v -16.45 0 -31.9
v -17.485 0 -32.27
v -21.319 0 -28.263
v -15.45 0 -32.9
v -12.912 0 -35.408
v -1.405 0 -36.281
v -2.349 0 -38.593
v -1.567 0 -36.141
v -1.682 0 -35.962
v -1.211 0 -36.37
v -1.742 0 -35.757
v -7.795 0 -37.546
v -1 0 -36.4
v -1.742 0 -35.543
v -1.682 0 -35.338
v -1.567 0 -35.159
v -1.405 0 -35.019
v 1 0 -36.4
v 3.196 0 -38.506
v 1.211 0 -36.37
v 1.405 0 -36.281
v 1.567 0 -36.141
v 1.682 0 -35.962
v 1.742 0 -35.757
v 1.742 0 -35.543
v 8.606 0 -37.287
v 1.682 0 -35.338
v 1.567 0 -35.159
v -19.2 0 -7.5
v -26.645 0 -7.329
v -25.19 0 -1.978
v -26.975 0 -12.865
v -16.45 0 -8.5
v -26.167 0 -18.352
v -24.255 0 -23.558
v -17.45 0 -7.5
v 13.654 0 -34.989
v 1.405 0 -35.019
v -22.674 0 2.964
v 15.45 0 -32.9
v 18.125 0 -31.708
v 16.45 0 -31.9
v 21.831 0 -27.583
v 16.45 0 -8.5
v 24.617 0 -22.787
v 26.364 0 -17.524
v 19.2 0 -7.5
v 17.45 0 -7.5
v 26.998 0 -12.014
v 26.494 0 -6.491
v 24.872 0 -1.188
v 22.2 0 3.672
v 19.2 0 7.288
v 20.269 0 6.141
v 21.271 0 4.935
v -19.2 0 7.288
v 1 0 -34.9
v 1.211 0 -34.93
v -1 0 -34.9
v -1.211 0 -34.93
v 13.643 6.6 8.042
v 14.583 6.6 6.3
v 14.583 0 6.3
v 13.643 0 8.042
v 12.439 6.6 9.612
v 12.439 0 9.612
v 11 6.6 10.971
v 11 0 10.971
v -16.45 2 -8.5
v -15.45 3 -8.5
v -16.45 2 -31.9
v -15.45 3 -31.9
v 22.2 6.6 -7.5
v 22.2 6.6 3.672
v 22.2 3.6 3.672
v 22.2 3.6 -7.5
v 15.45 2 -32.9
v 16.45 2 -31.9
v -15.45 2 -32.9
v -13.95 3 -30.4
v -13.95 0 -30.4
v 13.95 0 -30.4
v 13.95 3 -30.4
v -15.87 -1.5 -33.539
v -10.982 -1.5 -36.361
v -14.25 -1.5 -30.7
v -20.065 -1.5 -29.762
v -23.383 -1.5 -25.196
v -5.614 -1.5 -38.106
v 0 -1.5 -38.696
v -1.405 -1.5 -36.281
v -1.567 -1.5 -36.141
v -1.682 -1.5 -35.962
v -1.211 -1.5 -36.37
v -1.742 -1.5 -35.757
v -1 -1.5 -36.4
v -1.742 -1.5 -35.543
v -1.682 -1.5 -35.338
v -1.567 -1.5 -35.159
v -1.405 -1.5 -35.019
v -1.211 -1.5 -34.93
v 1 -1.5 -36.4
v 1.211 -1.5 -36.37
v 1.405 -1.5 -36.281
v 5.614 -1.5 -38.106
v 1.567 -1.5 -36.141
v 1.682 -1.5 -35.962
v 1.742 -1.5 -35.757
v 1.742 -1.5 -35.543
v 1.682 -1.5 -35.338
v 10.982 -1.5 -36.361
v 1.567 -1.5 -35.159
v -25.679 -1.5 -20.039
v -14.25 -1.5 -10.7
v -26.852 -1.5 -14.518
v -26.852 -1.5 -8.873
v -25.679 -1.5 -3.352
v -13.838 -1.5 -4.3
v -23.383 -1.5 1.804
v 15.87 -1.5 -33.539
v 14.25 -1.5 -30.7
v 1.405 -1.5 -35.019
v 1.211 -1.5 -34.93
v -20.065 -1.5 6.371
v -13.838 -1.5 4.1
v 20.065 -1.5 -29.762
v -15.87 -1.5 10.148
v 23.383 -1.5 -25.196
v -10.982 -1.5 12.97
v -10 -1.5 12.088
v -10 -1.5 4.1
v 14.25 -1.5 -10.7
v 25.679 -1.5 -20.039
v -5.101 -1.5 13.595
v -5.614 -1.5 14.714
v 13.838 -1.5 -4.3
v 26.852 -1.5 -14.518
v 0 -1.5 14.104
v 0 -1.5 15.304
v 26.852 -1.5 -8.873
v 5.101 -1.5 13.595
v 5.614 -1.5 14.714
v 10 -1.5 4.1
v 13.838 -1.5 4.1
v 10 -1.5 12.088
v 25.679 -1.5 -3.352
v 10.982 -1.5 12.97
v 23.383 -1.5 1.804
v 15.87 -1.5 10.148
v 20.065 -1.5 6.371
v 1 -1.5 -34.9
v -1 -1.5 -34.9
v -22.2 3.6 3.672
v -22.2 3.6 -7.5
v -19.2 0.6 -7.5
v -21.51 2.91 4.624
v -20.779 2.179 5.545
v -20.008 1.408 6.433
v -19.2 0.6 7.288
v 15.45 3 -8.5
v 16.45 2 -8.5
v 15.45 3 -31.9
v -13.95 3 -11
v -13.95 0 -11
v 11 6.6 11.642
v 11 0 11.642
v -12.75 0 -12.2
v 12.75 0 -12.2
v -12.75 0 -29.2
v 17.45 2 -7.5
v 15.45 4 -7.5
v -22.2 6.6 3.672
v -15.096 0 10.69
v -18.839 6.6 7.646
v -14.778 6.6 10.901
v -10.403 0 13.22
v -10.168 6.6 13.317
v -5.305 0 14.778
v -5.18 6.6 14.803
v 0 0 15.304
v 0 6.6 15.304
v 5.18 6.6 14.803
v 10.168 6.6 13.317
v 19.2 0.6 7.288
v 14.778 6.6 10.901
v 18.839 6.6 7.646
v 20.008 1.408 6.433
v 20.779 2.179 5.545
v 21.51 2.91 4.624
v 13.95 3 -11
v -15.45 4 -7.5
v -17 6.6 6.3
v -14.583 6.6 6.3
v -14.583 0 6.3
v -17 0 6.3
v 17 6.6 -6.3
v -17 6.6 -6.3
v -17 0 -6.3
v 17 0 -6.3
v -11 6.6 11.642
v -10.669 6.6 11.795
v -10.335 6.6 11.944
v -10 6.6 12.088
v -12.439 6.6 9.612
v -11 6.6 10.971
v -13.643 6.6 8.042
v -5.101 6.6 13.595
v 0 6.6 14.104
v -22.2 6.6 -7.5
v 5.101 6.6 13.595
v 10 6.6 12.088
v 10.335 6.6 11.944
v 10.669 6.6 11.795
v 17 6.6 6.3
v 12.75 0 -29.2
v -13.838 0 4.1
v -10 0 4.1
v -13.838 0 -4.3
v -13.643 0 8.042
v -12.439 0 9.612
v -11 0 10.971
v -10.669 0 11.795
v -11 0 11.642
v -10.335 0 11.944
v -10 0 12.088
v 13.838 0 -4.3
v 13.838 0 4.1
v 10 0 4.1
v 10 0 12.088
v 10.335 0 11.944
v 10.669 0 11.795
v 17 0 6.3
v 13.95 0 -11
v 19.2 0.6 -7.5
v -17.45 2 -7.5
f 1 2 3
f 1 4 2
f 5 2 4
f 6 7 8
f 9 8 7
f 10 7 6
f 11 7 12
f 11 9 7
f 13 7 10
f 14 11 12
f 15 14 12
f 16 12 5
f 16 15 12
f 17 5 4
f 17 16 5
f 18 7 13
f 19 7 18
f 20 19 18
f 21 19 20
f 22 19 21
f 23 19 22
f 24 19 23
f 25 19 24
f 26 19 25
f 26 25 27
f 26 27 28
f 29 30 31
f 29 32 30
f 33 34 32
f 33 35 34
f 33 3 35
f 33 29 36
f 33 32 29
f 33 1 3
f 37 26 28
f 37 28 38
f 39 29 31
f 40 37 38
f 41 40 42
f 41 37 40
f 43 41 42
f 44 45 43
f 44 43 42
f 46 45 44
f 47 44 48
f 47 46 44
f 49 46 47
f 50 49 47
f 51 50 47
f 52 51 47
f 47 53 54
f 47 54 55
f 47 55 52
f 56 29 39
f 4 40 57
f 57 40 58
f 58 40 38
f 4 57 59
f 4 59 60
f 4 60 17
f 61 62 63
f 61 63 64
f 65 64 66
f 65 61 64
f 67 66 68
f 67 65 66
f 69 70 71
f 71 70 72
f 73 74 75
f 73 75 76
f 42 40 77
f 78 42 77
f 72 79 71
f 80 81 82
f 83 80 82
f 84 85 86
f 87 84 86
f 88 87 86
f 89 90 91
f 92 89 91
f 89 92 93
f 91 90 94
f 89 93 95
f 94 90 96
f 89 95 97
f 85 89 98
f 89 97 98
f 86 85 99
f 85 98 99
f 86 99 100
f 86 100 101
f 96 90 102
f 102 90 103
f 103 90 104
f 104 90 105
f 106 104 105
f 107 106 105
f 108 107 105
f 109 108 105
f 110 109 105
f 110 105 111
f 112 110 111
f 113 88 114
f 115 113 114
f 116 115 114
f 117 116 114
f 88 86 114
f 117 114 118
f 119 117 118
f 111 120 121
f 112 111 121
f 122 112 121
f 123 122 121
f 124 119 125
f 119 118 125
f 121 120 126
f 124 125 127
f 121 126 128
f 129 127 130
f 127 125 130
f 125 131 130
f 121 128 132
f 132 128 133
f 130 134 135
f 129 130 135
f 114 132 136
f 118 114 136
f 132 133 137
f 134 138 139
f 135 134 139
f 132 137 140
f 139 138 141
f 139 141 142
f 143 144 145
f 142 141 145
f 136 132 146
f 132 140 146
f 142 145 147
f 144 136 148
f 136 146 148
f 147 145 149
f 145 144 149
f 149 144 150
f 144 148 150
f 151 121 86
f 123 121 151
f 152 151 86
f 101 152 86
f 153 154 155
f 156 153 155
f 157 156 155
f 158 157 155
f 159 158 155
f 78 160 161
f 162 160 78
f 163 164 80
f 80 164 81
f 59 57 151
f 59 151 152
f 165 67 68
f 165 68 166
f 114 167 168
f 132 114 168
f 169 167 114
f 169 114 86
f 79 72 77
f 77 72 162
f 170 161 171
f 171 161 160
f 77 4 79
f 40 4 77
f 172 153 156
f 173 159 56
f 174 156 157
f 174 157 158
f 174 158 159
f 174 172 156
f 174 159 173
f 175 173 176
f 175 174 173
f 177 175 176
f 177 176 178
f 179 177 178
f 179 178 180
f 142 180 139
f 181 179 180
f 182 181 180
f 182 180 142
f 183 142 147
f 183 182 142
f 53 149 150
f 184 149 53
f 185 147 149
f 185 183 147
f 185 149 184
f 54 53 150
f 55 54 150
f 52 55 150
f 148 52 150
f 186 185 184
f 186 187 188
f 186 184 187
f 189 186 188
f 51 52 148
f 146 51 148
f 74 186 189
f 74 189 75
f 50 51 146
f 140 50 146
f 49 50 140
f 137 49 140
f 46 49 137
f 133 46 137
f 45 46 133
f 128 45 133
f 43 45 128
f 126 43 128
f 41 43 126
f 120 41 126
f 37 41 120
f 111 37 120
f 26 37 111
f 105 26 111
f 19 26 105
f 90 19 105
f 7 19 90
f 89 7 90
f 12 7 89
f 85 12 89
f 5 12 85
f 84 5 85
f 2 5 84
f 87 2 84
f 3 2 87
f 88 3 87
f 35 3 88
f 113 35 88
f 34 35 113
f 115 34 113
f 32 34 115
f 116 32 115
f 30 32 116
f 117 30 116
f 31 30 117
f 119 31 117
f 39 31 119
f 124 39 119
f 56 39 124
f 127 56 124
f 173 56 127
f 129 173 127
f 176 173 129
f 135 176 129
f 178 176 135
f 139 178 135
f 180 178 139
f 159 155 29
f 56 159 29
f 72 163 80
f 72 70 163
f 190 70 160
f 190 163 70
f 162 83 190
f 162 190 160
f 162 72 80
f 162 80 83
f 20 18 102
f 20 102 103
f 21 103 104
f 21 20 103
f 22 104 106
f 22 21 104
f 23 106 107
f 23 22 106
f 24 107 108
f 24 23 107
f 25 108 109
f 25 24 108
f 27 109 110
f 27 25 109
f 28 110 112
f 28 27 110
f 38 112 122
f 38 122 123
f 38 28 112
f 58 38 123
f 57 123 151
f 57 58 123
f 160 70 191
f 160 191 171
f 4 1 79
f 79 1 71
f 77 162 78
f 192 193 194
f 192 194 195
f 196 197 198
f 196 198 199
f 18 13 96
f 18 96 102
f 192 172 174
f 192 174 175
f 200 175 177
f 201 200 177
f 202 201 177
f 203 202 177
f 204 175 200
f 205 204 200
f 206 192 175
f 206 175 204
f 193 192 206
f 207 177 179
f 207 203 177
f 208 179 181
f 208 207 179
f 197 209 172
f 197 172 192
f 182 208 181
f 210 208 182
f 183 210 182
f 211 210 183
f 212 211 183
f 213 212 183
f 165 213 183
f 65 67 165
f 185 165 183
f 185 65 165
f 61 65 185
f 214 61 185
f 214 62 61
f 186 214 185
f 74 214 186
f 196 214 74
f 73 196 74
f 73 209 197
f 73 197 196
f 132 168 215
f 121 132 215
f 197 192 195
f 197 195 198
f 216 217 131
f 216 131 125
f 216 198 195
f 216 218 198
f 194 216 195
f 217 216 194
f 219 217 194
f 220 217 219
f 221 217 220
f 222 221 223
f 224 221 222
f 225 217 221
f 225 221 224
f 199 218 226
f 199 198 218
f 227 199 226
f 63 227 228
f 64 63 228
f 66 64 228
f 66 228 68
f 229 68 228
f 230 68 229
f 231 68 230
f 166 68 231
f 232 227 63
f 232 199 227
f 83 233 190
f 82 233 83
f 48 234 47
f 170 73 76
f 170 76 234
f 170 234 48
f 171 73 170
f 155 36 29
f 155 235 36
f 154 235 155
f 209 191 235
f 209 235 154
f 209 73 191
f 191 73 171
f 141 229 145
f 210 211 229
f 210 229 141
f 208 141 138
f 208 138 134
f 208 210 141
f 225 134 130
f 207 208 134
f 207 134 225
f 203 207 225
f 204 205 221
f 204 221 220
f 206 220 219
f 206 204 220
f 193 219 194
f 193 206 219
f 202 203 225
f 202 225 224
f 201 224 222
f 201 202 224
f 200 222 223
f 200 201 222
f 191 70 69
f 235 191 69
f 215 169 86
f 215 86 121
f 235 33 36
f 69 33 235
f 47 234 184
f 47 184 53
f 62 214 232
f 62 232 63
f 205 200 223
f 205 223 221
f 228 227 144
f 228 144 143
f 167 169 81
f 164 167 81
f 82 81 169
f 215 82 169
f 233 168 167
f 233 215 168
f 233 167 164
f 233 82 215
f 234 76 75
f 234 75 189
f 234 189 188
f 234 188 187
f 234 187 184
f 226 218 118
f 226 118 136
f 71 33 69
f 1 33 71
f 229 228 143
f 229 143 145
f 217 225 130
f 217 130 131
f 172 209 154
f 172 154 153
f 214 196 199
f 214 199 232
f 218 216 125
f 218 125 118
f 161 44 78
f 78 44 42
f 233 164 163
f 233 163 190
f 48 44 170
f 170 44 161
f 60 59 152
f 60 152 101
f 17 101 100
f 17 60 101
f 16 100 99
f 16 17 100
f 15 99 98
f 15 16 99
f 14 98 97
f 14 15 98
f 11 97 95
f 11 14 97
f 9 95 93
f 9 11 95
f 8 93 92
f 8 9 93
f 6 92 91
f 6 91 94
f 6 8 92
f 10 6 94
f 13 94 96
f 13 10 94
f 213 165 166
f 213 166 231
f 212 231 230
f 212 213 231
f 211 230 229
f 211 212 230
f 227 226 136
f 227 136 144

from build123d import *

# Parameters (mm, degrees)
SKETCH1_R                      = 27
SKETCH1_W                      = 25.5
SKETCH1_H                      = 17
BOSS_EXTRUDE1_DEPTH            = 1.5
BOSS_EXTRUDE2_START            = 6.6
BOSS_EXTRUDE2_DEPTH            = 6.6
CUT_EXTRUDE1_REACH             = 44.685
CUT_EXTRUDE1_END_RADIUS        = 27
CUT_EXTRUDE1_DIRECTION_2_DEPTH = 1.2
SKETCH1_5_W                    = 32.9
SKETCH1_5_H                    = 25.4
SKETCH1_5_W_2                  = 27.9
SKETCH1_5_H_2                  = 19.4
BOSS_EXTRUDE3_DEPTH            = 3
CHAMFER1_SIZE                  = 1.5
CHAMFER2_SIZE                  = 1


with BuildPart() as part:
    # Sketch1 → Boss-Extrude1 (new body)
    with BuildSketch(Plane(origin=(0, 0, 0), x_dir=(1, 0, 0), z_dir=(0, 1, 0))):
        with Locations(Location((0, 11.695639977, 0), (0, 0, 270))):
            Circle(SKETCH1_R)
        with BuildLine():
            Line((10, -4.1), (10, -12.087547362))
            ThreePointArc((10, -12.087547362), (0, -14.104360023), (-10, -12.087547362))
            Line((-10, -12.087547362), (-10, -4.1))
            Line((-10, -4.1), (-13.837653888, -4.1))
            Line((-13.837653888, -4.1), (-13.837653888, 4.3))
            Line((-13.837653888, 4.3), (13.837653888, 4.3))
            Line((13.837653888, 4.3), (13.837653888, -4.1))
            Line((13.837653888, -4.1), (10, -4.1))
        make_face(mode=Mode.SUBTRACT)
        with BuildLine():
            ThreePointArc((-1, 34.9), (-1.75, 35.65), (-1, 36.4))
            Line((-1, 36.4), (1, 36.4))
            ThreePointArc((1, 36.4), (1.75, 35.65), (1, 34.9))
            Line((1, 34.9), (-1, 34.9))
        make_face(mode=Mode.SUBTRACT)
        with Locations((0, 20.7)):
            Rectangle(SKETCH1_W, SKETCH1_H, mode=Mode.SUBTRACT)
    extrude(amount=-BOSS_EXTRUDE1_DEPTH)

    # Sketch1<3> → Boss-Extrude2 (add)
    with BuildSketch(Plane(origin=(0, 0, 0), x_dir=(1, 0, 0), z_dir=(0, 1, 0)).offset(BOSS_EXTRUDE2_START)):
        with BuildLine():
            Line((-16.45, 7.5), (-22.2, 7.5))
            Line((-22.2, 7.5), (-22.2, -3.671858193))
            ThreePointArc((-22.2, -3.671858193), (0, -15.304360023), (22.2, -3.671858193))
            Line((22.2, -3.671858193), (22.2, 7.5))
            Line((22.2, 7.5), (16.45, 7.5))
            Line((16.45, 7.5), (-16.45, 7.5))
        make_face()
        with BuildLine():
            Line((-17, -6.3), (-17, 6.3))
            Line((-17, 6.3), (17, 6.3))
            Line((17, 6.3), (17, -6.3))
            Line((17, -6.3), (14.582906959, -6.3))
            ThreePointArc((14.582906959, -6.3), (13.072174848, -8.850843183), (11, -10.971032764))
            Line((11, -10.971032764), (11, -11.641883456))
            ThreePointArc((11, -11.641883456), (10.502364214, -11.870020335), (10, -12.087547362))
            ThreePointArc((10, -12.087547362), (0, -14.104360023), (-10, -12.087547362))
            ThreePointArc((-10, -12.087547362), (-10.502364214, -11.870020335), (-11, -11.641883456))
            Line((-11, -11.641883456), (-11, -10.971032764))
            ThreePointArc((-11, -10.971032764), (-13.072174848, -8.850843183), (-14.582906959, -6.3))
            Line((-14.582906959, -6.3), (-17, -6.3))
        make_face(mode=Mode.SUBTRACT)
    extrude(amount=-BOSS_EXTRUDE2_DEPTH)

    # Cut-Extrude1: up to this cylinder (the profile starts inside it)
    cut_extrude1_end = Plane(origin=(0, 1.228571, -11.695639977), z_dir=(0, 1, 0)) * Cylinder(CUT_EXTRUDE1_END_RADIUS, 144.37, mode=Mode.PRIVATE)
    # Sketch2 → Cut-Extrude1 (cut, up to the surface)
    with BuildSketch(Plane.XY.offset(-6.3), mode=Mode.PRIVATE) as cut_extrude1_sk1:
        Polygon((-22.2, 3.6), (-19.2, 0.6), (-19.2, 0), (-22.2, 0), align=None)
    cut_extrude1_tool1 = extrude(cut_extrude1_sk1.sketch, amount=CUT_EXTRUDE1_REACH, mode=Mode.PRIVATE) & cut_extrude1_end
    add(cut_extrude1_tool1.solids().sort_by_distance((-21.057143, 1.228571, -6.3))[0], mode=Mode.SUBTRACT)
    # Sketch2 → Cut-Extrude1 (cut, up to the surface)
    with BuildSketch(Plane.XY.offset(-6.3), mode=Mode.PRIVATE) as cut_extrude1_sk2:
        Polygon((19.2, 0.6), (19.2, 0), (22.2, 0), (22.2, 3.6), align=None)
    cut_extrude1_tool2 = extrude(cut_extrude1_sk2.sketch, amount=CUT_EXTRUDE1_REACH, mode=Mode.PRIVATE) & cut_extrude1_end
    add(cut_extrude1_tool2.solids().sort_by_distance((21.057143, 1.228571, -6.3))[0], mode=Mode.SUBTRACT)

    # Sketch2 → Cut-Extrude1 direction 2 (cut)
    with BuildSketch(Plane.XY.offset(-6.3)):
        Polygon((-22.2, 3.6), (-19.2, 0.6), (-19.2, 0), (-22.2, 0), align=None)
        Polygon((19.2, 0.6), (19.2, 0), (22.2, 0), (22.2, 3.6), align=None)
    extrude(amount=-CUT_EXTRUDE1_DIRECTION_2_DEPTH, mode=Mode.SUBTRACT)

    # Sketch1<5> → Boss-Extrude3 (add)
    with BuildSketch(Plane(origin=(0, 0, 0), x_dir=(1, 0, 0), z_dir=(0, 1, 0))):
        with Locations((0, 20.2)):
            Rectangle(SKETCH1_5_W, SKETCH1_5_H)
        with Locations((0, 20.7)):
            Rectangle(SKETCH1_5_W_2, SKETCH1_5_H_2, mode=Mode.SUBTRACT)
    extrude(amount=BOSS_EXTRUDE3_DEPTH)

    # Chamfer1
    chamfer1_edges = [part.edges().sort_by_distance(p)[0] for p in [
        (-12.75, -1.5, -20.7),
        (0, -1.5, -12.2),
        (0, -1.5, -29.2),
        (12.75, -1.5, -20.7),
    ]]
    chamfer(chamfer1_edges, length=CHAMFER1_SIZE - 0.0001)  # a hair under: the kernel refuses the full size

    # Chamfer2
    chamfer2_edges = [part.edges().sort_by_distance(p)[0] for p in [
        (16.45, 3, -20.2),
        (16.45, 1.5, -7.5),
        (0, 3, -32.9),
        (16.45, 1.5, -32.9),
        (-16.45, 1.5, -32.9),
        (-16.45, 1.5, -7.5),
        (-16.45, 3, -20.2),
        (0, 3, -7.5),
    ]]
    chamfer(chamfer2_edges, length=CHAMFER2_SIZE)


solid = part.part
